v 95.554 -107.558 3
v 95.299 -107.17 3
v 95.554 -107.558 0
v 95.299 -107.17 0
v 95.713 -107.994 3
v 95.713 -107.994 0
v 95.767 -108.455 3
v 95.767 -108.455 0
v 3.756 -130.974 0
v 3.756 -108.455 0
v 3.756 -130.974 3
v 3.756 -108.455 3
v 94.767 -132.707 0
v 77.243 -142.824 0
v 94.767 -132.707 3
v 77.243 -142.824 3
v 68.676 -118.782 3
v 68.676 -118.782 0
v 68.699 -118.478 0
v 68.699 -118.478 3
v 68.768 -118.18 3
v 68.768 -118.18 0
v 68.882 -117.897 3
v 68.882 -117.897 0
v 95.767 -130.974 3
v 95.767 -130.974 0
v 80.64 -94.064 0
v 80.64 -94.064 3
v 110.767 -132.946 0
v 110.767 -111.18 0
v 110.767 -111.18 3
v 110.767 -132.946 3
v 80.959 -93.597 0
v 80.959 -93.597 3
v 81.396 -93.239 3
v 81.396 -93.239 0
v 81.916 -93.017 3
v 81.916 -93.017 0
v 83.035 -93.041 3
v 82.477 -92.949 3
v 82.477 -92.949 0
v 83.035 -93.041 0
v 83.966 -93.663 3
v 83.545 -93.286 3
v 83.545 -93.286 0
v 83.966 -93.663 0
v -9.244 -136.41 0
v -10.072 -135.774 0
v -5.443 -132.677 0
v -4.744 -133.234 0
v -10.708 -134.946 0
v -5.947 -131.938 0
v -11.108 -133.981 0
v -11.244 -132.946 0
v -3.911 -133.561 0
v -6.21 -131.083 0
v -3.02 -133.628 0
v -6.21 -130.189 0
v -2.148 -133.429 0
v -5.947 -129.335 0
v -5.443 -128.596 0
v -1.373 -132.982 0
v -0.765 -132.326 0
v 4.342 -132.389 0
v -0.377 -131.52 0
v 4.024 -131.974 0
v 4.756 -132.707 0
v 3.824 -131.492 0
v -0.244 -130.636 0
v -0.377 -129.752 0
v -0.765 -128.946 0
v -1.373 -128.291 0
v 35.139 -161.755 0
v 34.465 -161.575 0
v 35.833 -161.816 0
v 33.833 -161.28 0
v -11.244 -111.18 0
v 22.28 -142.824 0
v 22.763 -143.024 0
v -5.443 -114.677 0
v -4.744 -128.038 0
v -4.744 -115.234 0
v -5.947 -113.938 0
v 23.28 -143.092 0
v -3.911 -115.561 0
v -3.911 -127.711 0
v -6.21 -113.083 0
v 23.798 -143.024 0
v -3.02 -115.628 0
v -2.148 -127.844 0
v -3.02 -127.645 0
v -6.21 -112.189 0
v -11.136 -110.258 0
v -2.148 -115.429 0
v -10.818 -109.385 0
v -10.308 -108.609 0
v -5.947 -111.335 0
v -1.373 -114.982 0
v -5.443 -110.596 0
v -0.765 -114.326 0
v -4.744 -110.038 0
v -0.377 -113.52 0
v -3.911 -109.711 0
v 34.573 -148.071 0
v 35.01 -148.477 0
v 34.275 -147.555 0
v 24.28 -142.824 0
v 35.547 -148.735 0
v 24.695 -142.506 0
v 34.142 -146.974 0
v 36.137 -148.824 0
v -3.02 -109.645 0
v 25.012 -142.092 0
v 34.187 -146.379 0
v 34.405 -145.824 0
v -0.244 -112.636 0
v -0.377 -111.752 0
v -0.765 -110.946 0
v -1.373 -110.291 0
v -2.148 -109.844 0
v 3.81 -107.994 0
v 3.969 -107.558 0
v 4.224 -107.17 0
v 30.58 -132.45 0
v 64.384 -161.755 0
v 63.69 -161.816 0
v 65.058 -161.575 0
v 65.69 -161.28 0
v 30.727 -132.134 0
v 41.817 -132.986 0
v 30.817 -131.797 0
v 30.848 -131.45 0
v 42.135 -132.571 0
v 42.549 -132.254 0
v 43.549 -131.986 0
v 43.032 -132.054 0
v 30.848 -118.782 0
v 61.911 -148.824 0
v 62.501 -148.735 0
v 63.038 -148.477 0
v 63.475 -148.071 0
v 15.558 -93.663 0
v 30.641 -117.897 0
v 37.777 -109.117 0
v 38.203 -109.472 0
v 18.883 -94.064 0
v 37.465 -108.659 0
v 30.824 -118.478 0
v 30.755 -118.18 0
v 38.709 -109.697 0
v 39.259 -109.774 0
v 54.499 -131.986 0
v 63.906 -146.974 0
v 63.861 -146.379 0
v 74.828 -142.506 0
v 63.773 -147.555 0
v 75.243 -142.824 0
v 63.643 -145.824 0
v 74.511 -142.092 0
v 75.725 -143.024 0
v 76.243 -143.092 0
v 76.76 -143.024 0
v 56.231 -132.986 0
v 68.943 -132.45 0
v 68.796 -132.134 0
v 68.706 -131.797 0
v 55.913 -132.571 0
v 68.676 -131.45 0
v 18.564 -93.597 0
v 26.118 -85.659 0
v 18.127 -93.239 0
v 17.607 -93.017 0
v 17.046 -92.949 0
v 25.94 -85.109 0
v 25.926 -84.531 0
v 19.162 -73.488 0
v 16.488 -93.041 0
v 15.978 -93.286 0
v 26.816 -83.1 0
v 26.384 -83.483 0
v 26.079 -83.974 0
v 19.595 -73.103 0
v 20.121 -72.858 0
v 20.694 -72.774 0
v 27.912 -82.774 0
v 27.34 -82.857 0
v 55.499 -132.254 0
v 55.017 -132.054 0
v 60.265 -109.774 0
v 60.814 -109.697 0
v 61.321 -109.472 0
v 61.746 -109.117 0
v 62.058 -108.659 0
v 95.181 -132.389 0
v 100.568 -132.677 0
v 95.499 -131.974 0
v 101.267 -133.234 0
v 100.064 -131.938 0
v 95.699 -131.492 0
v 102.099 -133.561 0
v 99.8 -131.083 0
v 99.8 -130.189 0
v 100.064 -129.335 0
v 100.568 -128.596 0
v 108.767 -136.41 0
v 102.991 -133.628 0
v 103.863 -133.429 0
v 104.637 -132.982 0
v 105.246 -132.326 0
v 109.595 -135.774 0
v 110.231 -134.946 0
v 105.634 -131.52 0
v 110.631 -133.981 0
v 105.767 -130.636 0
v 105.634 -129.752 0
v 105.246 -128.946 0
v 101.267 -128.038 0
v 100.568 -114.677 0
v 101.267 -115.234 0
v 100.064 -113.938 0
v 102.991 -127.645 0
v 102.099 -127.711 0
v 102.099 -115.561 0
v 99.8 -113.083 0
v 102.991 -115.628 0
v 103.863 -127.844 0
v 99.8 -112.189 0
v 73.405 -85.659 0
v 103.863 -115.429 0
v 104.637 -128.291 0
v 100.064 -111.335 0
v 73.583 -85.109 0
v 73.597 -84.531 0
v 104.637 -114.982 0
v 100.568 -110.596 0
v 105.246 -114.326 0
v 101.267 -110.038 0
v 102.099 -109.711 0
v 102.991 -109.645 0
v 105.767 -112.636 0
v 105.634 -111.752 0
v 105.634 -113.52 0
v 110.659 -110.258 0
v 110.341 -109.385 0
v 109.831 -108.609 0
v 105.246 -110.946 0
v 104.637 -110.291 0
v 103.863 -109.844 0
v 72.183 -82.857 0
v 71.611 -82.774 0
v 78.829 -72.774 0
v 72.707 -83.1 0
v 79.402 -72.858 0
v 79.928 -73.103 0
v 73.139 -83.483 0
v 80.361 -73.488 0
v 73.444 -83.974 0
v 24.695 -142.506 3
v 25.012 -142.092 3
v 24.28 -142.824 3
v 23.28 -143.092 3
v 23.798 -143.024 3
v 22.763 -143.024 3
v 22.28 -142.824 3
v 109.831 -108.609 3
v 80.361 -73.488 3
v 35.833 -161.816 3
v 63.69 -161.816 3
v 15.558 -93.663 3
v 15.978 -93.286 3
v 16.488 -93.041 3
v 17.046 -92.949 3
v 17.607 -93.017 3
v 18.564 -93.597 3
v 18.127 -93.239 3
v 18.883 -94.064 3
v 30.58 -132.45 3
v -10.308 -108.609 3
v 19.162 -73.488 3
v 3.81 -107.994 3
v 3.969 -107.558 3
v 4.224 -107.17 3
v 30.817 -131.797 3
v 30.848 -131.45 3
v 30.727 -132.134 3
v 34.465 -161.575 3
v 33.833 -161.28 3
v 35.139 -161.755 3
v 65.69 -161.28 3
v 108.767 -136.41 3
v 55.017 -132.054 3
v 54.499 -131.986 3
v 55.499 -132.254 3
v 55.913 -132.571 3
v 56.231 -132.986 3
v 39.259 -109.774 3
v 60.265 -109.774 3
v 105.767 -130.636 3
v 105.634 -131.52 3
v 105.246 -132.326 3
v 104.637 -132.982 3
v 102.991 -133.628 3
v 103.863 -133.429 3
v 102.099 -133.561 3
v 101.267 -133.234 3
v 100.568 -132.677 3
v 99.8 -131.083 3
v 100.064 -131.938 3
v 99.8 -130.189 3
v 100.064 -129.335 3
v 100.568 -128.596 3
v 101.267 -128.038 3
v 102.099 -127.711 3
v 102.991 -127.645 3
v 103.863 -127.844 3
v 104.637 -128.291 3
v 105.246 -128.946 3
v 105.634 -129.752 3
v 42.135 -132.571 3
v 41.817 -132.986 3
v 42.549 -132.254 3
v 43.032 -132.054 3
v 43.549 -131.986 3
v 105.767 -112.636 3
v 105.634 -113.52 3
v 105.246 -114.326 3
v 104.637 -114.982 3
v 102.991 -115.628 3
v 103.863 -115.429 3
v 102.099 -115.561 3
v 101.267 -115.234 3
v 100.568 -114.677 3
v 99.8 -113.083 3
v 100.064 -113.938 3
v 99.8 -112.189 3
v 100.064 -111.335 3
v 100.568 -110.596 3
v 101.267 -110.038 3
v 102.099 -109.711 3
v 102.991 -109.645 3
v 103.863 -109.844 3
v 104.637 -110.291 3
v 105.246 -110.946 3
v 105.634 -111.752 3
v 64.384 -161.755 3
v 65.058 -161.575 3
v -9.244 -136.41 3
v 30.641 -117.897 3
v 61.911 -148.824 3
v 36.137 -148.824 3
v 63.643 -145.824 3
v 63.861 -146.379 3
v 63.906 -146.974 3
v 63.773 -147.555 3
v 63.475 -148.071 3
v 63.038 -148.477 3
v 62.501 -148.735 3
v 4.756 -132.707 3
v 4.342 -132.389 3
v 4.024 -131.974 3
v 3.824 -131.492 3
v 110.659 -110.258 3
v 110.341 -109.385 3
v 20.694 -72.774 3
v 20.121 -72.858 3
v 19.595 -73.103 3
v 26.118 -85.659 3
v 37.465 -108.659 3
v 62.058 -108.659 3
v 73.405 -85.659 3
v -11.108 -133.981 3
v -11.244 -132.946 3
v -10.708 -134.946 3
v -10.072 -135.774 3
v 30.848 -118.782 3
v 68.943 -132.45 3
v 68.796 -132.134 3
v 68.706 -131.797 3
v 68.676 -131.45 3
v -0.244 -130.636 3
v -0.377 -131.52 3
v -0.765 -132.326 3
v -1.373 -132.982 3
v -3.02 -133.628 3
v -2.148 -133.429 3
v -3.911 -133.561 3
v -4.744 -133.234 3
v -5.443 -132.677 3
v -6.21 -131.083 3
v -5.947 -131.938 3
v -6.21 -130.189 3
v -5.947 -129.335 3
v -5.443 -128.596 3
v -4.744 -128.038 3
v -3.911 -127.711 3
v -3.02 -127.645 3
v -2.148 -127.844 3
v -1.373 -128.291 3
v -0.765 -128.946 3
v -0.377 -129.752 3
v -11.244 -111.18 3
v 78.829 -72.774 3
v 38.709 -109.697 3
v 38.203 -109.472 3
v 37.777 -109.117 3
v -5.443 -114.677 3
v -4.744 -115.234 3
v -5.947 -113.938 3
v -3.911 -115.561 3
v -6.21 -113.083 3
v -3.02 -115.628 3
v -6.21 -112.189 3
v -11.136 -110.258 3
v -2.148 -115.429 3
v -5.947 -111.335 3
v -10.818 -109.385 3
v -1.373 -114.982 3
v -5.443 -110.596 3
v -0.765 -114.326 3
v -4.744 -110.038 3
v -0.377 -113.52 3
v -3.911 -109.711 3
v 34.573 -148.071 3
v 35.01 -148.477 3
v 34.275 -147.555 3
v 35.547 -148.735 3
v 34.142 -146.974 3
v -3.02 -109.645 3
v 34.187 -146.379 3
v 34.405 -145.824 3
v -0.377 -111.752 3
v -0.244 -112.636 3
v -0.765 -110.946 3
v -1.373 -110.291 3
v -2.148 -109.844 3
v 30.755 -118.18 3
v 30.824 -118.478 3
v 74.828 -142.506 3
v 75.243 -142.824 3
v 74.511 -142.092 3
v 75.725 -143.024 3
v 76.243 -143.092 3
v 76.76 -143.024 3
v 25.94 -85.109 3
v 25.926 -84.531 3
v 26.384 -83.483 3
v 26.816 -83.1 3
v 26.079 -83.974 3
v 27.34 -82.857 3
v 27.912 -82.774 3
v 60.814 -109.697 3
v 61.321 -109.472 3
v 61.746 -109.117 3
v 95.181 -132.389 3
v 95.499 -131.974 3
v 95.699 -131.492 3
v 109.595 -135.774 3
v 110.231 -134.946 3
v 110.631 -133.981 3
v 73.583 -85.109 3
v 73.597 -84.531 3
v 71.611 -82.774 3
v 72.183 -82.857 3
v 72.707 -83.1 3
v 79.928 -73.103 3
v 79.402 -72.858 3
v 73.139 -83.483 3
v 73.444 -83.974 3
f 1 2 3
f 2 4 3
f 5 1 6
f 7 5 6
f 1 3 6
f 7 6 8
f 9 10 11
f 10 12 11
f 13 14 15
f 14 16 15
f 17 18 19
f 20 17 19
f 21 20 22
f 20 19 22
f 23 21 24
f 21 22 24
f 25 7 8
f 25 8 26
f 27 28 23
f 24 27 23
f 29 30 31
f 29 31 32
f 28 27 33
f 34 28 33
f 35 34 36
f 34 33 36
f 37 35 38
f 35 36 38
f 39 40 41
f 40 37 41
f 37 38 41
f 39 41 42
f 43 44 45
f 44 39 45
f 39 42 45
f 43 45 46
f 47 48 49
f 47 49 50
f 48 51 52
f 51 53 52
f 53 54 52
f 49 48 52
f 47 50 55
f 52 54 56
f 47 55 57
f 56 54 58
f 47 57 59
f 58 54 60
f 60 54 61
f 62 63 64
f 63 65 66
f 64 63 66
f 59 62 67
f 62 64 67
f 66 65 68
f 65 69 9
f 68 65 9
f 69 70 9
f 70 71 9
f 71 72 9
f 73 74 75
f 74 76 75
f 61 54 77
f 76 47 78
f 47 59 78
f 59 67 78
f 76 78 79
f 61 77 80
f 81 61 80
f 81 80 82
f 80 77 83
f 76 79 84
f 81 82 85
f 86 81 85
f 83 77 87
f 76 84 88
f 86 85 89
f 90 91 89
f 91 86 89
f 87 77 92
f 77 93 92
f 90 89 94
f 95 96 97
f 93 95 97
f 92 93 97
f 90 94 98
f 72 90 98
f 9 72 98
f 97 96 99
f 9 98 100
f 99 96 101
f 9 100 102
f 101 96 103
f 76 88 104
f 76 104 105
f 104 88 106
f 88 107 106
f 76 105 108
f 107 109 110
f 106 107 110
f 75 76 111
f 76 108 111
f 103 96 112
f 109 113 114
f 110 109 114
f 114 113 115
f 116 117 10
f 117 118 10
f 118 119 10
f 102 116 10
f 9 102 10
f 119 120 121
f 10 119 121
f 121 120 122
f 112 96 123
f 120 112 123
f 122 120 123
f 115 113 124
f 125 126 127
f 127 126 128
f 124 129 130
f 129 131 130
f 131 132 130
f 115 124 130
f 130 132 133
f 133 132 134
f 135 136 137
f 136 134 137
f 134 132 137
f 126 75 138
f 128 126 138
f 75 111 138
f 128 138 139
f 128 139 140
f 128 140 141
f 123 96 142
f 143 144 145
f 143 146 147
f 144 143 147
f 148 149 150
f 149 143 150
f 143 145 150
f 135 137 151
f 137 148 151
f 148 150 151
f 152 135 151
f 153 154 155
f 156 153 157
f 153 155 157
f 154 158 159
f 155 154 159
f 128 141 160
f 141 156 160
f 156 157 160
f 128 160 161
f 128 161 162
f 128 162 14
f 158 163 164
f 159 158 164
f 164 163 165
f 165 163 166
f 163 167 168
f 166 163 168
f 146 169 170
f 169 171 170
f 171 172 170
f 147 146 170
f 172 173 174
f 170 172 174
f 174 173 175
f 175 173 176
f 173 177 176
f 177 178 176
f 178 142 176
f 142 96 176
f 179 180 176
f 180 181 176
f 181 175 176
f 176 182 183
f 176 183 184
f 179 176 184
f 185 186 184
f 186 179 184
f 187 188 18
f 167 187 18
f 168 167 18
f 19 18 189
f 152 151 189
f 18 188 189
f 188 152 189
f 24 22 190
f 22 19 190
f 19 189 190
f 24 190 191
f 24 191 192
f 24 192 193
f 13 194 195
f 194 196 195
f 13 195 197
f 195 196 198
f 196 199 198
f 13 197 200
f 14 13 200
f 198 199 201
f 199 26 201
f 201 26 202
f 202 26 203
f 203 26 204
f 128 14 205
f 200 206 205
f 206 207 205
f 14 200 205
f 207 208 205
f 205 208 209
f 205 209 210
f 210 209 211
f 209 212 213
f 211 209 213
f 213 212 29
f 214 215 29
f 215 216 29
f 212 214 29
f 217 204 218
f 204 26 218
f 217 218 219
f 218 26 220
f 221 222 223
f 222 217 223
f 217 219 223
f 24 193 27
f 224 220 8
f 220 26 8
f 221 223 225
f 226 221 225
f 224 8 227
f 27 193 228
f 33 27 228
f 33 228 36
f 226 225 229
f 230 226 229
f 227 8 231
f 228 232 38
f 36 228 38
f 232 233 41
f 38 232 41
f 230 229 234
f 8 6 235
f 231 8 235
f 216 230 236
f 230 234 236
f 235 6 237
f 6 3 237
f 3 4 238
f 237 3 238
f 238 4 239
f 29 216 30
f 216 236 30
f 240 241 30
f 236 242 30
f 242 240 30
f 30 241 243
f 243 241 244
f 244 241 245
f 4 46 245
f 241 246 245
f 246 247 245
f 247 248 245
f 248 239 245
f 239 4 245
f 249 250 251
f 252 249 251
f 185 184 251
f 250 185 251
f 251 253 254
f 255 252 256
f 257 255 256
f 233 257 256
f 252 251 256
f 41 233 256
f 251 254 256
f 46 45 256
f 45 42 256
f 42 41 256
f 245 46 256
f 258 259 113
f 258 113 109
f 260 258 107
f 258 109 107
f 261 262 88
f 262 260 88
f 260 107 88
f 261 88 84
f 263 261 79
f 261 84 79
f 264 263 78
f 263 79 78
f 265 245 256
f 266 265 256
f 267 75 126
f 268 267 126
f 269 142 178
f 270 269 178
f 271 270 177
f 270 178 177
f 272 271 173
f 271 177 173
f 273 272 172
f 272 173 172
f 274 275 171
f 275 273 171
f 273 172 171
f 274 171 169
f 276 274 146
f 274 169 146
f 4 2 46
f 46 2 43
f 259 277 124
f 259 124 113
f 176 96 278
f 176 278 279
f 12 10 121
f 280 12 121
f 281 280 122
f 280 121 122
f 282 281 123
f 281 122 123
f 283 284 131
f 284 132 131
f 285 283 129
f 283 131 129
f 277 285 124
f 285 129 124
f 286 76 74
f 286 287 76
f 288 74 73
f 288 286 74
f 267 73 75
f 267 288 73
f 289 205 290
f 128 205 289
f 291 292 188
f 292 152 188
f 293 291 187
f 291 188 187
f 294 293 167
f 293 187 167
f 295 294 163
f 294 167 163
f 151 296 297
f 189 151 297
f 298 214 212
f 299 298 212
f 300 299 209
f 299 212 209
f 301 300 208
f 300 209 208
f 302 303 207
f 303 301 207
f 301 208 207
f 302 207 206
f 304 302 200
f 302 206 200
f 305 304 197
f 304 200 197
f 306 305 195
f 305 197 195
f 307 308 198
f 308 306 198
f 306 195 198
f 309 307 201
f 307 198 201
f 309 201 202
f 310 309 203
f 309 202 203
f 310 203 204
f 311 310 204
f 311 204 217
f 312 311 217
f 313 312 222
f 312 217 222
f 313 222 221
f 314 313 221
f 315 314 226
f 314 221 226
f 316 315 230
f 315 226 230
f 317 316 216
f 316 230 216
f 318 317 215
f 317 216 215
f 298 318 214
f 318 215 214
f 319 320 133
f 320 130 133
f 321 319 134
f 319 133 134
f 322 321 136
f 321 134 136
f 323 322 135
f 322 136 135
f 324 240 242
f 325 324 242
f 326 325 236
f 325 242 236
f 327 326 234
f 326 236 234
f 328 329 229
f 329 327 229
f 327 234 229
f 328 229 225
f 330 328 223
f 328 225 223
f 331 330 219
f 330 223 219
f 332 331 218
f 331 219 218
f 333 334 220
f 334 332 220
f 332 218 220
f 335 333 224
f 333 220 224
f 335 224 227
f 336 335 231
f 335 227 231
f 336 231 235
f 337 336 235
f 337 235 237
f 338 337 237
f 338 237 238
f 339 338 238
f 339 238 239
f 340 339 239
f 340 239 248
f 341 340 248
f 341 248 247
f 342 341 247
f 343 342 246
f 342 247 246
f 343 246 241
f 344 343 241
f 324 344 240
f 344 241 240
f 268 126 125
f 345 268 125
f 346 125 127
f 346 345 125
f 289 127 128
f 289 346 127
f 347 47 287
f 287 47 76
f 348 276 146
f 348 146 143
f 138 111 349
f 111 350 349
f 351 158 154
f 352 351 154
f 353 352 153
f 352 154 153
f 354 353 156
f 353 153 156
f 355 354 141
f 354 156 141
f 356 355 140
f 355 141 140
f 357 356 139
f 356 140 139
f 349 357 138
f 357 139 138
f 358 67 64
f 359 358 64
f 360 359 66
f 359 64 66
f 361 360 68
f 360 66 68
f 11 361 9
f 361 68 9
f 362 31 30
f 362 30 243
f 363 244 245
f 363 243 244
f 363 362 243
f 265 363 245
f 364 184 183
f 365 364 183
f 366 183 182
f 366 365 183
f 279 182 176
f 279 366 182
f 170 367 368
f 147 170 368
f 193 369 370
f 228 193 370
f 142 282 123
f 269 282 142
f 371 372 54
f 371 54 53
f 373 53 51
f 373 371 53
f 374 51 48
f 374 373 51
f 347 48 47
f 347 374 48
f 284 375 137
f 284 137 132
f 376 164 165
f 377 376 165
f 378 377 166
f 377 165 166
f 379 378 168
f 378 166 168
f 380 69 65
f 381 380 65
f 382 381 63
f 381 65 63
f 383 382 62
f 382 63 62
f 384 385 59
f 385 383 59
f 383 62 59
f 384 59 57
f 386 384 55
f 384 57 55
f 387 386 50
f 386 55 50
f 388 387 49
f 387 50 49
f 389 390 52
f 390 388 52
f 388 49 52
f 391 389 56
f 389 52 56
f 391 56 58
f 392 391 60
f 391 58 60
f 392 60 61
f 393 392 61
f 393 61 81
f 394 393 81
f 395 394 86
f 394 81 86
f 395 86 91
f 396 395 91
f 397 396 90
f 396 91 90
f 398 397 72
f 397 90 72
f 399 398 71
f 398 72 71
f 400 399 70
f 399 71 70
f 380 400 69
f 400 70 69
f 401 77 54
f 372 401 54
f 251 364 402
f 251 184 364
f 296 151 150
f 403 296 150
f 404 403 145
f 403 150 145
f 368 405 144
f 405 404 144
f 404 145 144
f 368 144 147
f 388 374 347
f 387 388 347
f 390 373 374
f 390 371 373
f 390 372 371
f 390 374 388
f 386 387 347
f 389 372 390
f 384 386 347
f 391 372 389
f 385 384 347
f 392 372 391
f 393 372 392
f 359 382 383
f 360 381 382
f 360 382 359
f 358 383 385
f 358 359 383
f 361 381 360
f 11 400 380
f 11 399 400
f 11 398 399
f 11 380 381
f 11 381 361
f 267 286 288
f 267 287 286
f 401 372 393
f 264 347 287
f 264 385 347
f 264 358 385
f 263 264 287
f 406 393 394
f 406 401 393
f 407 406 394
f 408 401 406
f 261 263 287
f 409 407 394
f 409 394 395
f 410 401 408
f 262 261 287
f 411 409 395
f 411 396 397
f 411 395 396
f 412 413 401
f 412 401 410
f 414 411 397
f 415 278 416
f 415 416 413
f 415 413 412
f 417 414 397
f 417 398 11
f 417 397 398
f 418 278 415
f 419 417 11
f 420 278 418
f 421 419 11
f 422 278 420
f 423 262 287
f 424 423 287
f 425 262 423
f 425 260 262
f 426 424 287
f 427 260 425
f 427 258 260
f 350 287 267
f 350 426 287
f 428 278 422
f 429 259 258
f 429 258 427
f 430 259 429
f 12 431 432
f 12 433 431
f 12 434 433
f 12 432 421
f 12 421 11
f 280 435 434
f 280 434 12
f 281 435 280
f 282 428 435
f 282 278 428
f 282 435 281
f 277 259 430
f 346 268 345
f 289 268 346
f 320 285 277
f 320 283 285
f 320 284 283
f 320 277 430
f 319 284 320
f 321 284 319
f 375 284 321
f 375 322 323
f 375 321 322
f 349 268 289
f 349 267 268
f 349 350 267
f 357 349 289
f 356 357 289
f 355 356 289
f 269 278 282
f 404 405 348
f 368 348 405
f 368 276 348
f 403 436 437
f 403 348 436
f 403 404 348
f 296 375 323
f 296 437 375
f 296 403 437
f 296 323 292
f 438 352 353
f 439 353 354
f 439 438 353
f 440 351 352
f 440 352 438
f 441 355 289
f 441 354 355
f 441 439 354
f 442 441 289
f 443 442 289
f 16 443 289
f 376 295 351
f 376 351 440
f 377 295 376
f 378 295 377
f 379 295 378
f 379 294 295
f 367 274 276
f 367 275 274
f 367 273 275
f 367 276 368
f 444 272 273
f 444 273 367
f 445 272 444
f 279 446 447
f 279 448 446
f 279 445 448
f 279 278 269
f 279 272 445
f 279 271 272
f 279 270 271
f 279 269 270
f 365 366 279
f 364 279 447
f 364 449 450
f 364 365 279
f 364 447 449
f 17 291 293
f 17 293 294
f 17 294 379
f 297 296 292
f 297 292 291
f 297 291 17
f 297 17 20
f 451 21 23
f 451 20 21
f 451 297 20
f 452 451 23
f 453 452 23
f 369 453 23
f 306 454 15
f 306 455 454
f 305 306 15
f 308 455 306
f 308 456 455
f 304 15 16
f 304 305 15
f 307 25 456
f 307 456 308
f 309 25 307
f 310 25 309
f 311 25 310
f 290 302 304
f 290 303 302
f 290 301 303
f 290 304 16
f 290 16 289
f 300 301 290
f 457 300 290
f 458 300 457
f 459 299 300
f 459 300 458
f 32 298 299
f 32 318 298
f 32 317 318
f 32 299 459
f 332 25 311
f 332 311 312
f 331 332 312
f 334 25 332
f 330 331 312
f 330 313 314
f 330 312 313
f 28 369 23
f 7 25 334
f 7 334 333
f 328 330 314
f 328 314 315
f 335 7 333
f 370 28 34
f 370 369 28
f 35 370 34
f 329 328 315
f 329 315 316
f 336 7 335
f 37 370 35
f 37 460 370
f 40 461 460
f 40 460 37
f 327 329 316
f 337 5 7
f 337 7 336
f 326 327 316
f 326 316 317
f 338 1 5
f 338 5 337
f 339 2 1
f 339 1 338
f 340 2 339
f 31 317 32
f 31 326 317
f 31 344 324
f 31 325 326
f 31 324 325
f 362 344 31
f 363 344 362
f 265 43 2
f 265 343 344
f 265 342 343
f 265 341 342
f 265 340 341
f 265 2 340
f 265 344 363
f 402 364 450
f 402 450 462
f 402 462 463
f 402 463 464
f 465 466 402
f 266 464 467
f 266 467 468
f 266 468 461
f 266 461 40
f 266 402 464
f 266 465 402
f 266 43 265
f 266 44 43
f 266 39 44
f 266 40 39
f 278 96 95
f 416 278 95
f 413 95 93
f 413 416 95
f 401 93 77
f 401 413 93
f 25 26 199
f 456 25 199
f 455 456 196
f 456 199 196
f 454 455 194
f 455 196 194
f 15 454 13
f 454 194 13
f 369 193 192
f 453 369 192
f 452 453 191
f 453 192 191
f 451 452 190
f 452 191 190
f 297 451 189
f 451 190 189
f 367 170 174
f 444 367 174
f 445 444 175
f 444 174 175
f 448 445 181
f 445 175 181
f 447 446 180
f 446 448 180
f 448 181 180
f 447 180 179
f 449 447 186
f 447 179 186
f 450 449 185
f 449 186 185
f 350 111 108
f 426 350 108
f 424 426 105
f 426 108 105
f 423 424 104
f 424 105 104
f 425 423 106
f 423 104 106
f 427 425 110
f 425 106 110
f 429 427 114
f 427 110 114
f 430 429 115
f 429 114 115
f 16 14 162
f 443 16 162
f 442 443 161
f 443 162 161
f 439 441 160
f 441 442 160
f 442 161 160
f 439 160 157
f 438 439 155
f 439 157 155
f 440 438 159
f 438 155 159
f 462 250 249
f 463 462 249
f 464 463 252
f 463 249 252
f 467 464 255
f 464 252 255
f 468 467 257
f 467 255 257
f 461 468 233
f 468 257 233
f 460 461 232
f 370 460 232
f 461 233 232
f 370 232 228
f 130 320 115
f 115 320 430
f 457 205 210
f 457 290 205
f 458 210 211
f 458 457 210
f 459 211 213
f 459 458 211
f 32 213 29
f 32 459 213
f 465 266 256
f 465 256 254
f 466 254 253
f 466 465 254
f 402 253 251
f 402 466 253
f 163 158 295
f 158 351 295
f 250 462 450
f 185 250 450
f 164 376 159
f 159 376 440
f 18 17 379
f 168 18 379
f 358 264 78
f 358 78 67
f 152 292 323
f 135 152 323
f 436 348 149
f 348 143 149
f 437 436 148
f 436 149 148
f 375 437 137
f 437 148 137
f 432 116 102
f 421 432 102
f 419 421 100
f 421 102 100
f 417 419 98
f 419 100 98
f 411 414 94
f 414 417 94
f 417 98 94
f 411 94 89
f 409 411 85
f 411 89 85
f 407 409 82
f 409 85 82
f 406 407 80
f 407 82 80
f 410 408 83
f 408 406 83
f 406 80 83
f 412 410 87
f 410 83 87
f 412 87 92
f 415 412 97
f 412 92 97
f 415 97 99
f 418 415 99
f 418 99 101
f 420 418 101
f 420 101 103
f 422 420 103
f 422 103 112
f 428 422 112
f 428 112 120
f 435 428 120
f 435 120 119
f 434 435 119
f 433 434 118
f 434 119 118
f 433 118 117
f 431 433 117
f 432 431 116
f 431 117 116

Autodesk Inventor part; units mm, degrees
ref_plane "YZ Plane" through (0, 0, 0) normal (1, 0, 0) x (0, 1, 0)
ref_plane "XZ Plane" through (0, 0, 0) normal (0, 1, 0) x (-1, 0, 0)
ref_plane "XY Plane" through (0, 0, 0) normal (0, 0, 1) x (1, 0, 0)
sketch "Sketch1" plane through (0, 0, 0) normal (0, 0, 1) x (1, 0, 0)
  circle A0 centre (-3.2439, -112.6362) radius 2.7 construction
  circle A1 centre (-3.2439, -130.6362) radius 2.7 construction
  line L0 (49.7615, -342.4426) -> (49.7615, 314.6303) construction
  line L1 (-11.2439, -109.7245) -> (-11.2439, -135.255)
  line L2 (-11.2439, -109.7245) -> (19.7615, -72.7737)
  line L3 (19.7615, -72.7737) -> (49.7615, -72.7737)
  circle A2 centre (-3.2439, -112.6362) radius 3
  circle A3 centre (-3.2439, -130.6362) radius 3
  line L4 (-11.2439, -135.255) -> (34.7615, -161.8162)
  line L5 (34.7615, -161.8162) -> (49.7615, -161.8162)
  line L6 (110.7669, -109.7245) -> (110.7669, -135.255)
  line L7 (110.7669, -109.7245) -> (79.7615, -72.7737)
  line L8 (79.7615, -72.7737) -> (49.7615, -72.7737)
  circle A4 centre (102.7669, -112.6362) radius 3
  circle A5 centre (102.7669, -130.6362) radius 3
  line L9 (110.7669, -135.255) -> (64.7615, -161.8162)
  line L10 (64.7615, -161.8162) -> (49.7615, -161.8162)
  point P0 (0, 0)
  dimension "d0" = 6
  dimension "d1" = 6
  dimension "d8" = 8
  dimension "d16" = 30
  dimension "d17" = 15
  dimension "d18" = 60
  dimension "d19" = 40
  dimension "d20" = 8
  dimension "d21" = 8
extrude "Plate1" add sketch "Sketch1" along normal blind 3
fillet "Fillet1" radius 4 6 edges at (-11.2439, -135.255, 1.5) (-11.2439, -109.7245, 1.5) (110.7669, -109.7245, 1.5) (110.7669, -135.255, 1.5) (64.7615, -161.8162, 1.5) (34.7615, -161.8162, 1.5)
sketch "Sketch2" plane through (0, 0, 3) normal (0, 0, 1) x (1, 0, 0)
  arc A0 (19.774, -118.0434) -> (18.9211, -121.2485) centre (16.9316, -119.0031) ccw projected
  arc A1 (80.0915, -120.6614) -> (80.0915, -117.3448) centre (82.5915, -119.0031) ccw projected
  arc A2 (47.082, -94.8758) -> (52.441, -94.8758) centre (49.7615, -96.225) ccw projected
  line L0 (3.7561, -107.7275) -> (3.7561, -132.1292)
  line L1 (3.7561, -107.7275) -> (17.5274, -91.3156)
  line L2 (17.5274, -91.3156) -> (30.8475, -118.3156)
  line L3 (30.8475, -118.3156) -> (30.8475, -131.9856)
  line L4 (30.8475, -131.9856) -> (24.0125, -143.8242)
  line L5 (24.0125, -143.8242) -> (3.7561, -132.1292)
  line L6 (24.6949, -82.7737) -> (38.0151, -109.7737)
  line L7 (38.0151, -109.7737) -> (61.508, -109.7737)
  line L8 (19.7615, -72.7737) -> (79.7615, -72.7737) projected
  line L9 (61.508, -109.7737) -> (74.8281, -82.7737)
  line L10 (74.8281, -82.7737) -> (24.6949, -82.7737)
  line L11 (-10.308, -108.6092) -> (19.7615, -72.7737) projected
  line L12 (33.8333, -161.2803) -> (-9.2439, -136.4097) projected
  line L13 (-11.2439, -132.9456) -> (-11.2439, -111.1803) projected
  arc A3 (63.6897, -161.8162) -> (65.6897, -161.2803) centre (63.6897, -157.8162) ccw projected
  line L14 (19.7615, -72.7737) -> (63.6897, -161.8162) construction
  line L15 (17.5274, -91.3156) -> (24.6949, -82.7737) construction
  line L16 (38.0151, -109.7737) -> (30.8475, -118.3156) construction
  line L17 (49.7615, -82.7737) -> (49.7615, -72.7737) construction
  line L18 (79.7615, -72.7737) -> (109.8311, -108.6092) projected
  line L19 (35.8333, -161.8162) -> (63.6897, -161.8162) projected
  line L20 (79.7615, -72.7737) -> (35.8333, -161.8162) construction
  line L21 (95.7669, -107.7275) -> (95.7669, -132.1292)
  line L22 (95.7669, -107.7275) -> (81.9957, -91.3156)
  line L23 (81.9957, -91.3156) -> (68.6755, -118.3156)
  line L24 (68.6755, -118.3156) -> (68.6755, -131.9856)
  line L25 (68.6755, -131.9856) -> (75.5105, -143.8242)
  line L26 (75.5105, -143.8242) -> (95.7669, -132.1292)
  line L27 (42.3946, -131.9856) -> (32.6728, -148.8242)
  line L28 (32.6728, -148.8242) -> (65.3755, -148.8242)
  line L29 (65.3755, -148.8242) -> (55.6538, -131.9856)
  line L30 (55.6538, -131.9856) -> (42.3946, -131.9856)
  line L31 (30.8475, -131.9856) -> (68.6755, -131.9856) construction
  line L32 (24.0125, -143.8242) -> (32.6728, -148.8242) construction
  line L33 (65.3755, -148.8242) -> (75.5105, -143.8242) construction
  point P0 (0, 0)
  point P1 (37.5337, -140.4049)
  dimension "d22" = 10
  dimension "d23" = 15
  dimension "d24" = 27
  dimension "d25" = 10.2071
  dimension "d26" = 10.2071
  dimension "d27" = 10.2071
  dimension "d28" = 10
extrude "Cut1" cut sketch "Sketch2" against normal blind 3
fillet "Fillet2" radius 2 22 edges at (19.7615, -72.7737, 1.5) (79.7615, -72.7737, 1.5) (17.5274, -91.3156, 1.5) (3.7561, -107.7275, 1.5) (3.7561, -132.1292, 1.5) (24.0125, -143.8242, 1.5) (30.8475, -131.9856, 1.5) (30.8475, -118.3156, 1.5) (74.8281, -82.7737, 1.5) (24.6949, -82.7737, 1.5) (38.0151, -109.7737, 1.5) (61.508, -109.7737, 1.5) (81.9957, -91.3156, 1.5) (68.6755, -118.3156, 1.5) (68.6755, -131.9856, 1.5) (75.5105, -143.8242, 1.5) (95.7669, -132.1292, 1.5) (95.7669, -107.7275, 1.5) (55.6538, -131.9856, 1.5) (42.3946, -131.9856, 1.5) (32.6728, -148.8242, 1.5) (65.3755, -148.8242, 1.5)
equation "\"d26\" = d25"
equation "\"d27\" = d25"
equation "\"d10\" = Thickness"
equation "\"BendRadius\" = Thickness"
equation "\"BendReliefWidth\" = Thickness"
equation "\"BendReliefDepth\" = 0.5 * Thickness"
equation "\"CornerReliefSize\" = 4 * Thickness"
equation "\"MinimumRemnant\" = 2 * Thickness"
equation "\"TransitionRadius\" = BendRadius"
equation "\"JacobiRadiusSize\" = BendRadius"
equation "\"GapSize\" = Thickness"
equation "\"Thickness\" = 3"
properties part number "JawMount"
